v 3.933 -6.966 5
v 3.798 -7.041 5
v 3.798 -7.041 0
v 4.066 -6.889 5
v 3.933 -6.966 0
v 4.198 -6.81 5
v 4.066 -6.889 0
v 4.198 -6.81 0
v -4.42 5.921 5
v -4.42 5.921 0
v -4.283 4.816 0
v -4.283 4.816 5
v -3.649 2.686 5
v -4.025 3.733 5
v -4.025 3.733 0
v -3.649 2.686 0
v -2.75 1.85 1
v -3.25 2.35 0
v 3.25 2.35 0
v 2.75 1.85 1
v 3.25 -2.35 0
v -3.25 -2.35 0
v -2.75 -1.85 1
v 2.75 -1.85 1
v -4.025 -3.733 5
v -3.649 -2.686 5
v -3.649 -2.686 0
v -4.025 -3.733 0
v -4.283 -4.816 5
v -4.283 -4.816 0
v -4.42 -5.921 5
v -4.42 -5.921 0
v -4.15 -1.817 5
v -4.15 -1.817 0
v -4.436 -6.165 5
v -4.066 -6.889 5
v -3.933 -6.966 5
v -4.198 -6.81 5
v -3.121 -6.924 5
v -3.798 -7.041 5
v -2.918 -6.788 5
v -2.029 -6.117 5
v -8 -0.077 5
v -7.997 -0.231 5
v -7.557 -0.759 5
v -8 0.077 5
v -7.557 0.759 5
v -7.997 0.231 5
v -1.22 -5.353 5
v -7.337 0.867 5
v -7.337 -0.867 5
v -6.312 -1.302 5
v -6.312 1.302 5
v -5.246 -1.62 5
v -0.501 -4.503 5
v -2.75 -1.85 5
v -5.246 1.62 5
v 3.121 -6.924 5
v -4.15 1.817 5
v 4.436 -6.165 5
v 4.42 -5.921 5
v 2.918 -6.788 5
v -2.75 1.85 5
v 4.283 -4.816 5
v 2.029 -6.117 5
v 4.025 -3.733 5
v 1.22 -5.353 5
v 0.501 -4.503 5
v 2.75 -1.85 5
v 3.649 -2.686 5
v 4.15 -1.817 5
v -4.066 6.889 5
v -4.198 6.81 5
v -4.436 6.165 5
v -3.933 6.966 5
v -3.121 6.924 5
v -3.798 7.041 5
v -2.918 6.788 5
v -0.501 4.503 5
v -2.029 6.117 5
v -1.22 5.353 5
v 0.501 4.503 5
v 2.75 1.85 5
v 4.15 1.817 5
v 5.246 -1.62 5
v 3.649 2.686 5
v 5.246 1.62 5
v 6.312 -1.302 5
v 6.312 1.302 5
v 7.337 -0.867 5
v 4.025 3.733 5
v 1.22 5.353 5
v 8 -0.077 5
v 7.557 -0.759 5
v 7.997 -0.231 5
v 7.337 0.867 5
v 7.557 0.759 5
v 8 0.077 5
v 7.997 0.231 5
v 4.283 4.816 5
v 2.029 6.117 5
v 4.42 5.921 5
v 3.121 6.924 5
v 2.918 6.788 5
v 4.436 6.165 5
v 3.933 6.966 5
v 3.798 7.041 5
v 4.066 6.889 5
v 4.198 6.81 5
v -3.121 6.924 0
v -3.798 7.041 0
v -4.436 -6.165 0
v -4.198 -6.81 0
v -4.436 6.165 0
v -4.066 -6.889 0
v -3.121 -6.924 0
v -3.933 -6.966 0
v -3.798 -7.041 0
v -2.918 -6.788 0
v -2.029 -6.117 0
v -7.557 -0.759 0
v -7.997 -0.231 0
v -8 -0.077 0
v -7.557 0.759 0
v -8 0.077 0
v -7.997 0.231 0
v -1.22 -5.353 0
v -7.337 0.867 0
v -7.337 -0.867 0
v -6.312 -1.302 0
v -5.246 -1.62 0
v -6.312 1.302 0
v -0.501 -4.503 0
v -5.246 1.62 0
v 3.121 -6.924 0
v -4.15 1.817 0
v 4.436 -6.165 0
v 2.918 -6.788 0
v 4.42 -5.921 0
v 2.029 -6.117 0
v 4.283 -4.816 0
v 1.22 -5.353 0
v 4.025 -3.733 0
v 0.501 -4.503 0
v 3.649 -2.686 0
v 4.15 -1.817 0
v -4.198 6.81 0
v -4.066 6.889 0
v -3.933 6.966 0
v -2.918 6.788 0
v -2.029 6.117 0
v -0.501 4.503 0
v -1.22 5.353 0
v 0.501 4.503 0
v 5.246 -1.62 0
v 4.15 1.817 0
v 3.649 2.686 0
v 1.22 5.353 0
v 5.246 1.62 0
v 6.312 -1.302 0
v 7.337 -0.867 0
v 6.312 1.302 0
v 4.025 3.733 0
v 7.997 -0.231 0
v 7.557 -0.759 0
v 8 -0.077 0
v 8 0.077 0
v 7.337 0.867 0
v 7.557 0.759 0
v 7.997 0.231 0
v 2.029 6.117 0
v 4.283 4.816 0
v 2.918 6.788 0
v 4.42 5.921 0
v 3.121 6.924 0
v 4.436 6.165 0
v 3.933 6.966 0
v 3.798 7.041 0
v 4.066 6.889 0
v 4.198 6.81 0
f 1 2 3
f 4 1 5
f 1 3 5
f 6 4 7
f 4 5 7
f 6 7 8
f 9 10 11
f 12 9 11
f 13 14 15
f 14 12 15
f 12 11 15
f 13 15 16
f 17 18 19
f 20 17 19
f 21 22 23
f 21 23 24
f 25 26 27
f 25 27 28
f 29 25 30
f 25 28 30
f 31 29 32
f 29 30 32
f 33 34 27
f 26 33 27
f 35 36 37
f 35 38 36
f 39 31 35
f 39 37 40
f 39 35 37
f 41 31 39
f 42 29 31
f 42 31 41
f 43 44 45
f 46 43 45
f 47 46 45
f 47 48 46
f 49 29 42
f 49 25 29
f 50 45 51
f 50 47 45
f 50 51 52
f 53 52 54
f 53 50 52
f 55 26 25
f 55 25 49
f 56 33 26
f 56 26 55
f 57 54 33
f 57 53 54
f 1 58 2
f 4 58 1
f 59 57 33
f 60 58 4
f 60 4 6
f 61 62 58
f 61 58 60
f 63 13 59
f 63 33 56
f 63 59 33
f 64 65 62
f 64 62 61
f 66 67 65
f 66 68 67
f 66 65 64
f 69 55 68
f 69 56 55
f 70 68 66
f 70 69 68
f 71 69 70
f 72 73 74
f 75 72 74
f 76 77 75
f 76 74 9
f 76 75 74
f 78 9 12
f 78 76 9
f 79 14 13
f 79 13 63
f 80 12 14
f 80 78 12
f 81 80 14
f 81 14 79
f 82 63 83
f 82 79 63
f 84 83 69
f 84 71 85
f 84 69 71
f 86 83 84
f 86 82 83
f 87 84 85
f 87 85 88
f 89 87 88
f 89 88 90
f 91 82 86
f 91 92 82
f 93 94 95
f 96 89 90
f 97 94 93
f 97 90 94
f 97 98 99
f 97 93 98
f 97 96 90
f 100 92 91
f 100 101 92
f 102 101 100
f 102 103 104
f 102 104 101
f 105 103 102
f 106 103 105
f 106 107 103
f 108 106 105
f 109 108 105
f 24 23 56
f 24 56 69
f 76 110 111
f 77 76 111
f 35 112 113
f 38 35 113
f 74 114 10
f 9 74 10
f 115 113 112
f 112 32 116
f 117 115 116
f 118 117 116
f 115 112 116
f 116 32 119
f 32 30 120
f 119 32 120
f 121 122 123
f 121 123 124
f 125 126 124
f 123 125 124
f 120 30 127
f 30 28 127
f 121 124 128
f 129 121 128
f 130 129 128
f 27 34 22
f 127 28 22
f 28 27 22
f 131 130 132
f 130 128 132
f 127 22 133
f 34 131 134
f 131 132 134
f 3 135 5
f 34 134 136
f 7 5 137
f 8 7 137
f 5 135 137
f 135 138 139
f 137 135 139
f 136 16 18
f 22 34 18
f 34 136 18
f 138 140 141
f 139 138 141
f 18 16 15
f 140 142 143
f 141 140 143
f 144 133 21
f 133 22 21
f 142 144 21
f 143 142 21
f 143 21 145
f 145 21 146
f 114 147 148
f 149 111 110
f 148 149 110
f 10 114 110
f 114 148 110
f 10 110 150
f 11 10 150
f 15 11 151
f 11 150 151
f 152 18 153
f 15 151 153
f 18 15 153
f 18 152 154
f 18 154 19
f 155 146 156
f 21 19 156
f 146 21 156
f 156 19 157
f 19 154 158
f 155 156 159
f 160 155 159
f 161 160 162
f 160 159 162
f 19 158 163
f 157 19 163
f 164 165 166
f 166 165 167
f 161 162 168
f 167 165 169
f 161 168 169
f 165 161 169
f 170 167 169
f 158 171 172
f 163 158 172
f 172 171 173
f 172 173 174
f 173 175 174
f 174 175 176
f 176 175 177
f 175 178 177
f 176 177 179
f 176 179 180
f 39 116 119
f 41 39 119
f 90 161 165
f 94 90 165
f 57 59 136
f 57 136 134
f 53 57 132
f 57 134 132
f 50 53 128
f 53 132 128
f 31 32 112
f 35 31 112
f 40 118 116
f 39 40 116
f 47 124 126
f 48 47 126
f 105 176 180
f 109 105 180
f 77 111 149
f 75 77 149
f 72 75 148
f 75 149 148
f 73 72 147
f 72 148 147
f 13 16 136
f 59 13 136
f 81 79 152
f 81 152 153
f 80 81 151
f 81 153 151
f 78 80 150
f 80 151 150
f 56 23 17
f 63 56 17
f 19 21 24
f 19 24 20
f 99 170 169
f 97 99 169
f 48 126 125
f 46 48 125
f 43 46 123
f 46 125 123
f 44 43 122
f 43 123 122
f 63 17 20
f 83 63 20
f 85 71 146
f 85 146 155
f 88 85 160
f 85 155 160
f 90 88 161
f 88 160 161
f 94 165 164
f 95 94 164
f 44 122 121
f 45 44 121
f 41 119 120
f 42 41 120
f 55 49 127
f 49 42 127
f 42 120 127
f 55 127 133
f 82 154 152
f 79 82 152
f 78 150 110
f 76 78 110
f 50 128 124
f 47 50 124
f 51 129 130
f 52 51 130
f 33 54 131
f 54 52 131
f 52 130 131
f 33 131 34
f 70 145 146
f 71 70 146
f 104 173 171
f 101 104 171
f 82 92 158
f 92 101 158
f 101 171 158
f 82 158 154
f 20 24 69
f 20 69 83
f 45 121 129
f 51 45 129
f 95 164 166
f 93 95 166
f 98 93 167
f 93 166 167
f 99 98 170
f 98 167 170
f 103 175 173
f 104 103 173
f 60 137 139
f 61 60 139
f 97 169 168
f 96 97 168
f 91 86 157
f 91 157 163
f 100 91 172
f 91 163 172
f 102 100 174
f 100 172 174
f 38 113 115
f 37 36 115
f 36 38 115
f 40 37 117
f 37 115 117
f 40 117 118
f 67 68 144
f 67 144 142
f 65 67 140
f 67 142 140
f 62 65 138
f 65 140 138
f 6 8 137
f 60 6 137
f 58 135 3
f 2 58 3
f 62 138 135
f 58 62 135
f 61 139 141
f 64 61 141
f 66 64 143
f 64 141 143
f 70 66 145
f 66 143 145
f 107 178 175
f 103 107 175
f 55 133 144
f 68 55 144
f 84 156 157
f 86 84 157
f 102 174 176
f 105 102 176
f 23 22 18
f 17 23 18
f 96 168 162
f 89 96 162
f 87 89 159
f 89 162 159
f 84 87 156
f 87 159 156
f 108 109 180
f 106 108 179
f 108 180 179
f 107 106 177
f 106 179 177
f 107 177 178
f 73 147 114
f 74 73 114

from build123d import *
from OCP.BRepFilletAPI import BRepFilletAPI_MakeChamfer

# Parameters (mm, degrees)
SKETCH1_R           = 8
SKETCH1_W           = 5.5
SKETCH1_H           = 3.7
BOSS_EXTRUDE1_DEPTH = 5
CUT_EXTRUDE1_DEPTH  = 13.369316877
CIRPATTERN1_COUNT   = 6
FILLET1_R           = 10
CHAMFER1_SIZE       = 1
CHAMFER1_SIZE2      = 0.5


with BuildPart() as part:
    # Sketch1 → Boss-Extrude1 (new body)
    with BuildSketch(Plane.XY):
        Circle(SKETCH1_R)
        Rectangle(SKETCH1_W, SKETCH1_H, mode=Mode.SUBTRACT)
    extrude(amount=BOSS_EXTRUDE1_DEPTH)

    # Sketch2 → Cut-Extrude1 (cut, through all)
    with BuildSketch(Plane.XY):
        Polygon((-7.331932906, 22.221764399), (0, 24.952212466), (7.331932906, 22.221764399), (3.798424573, 7.040736522), (3.120998591, 6.924019842), (1.330058439, 5.723612136), (0.501497444, 4.50257488), (-0.501497444, 4.50257488), (-1.330058439, 5.723612136), (-3.120998591, 6.924019842), (-3.798424573, 7.040736522), align=None)
    cut_extrude1 = extrude(amount=CUT_EXTRUDE1_DEPTH, mode=Mode.SUBTRACT)

    # CirPattern1: Cut-Extrude1 ×6 about axis
    cirpattern1_axis = Axis((0, 0, 0), (0, 0, 1))
    for i in range(1, CIRPATTERN1_COUNT):
        add(cut_extrude1.rotate(cirpattern1_axis, i * 360 / CIRPATTERN1_COUNT), mode=Mode.SUBTRACT)

    # Fillet1
    # the kernel refuses this fillet: 10 mm, written as the material it takes off along each edge
    with BuildSketch(Plane(origin=(-1.330058439, -5.723612136, -4.777865205), x_dir=(0.5615014183372642, 0.8274757743917586, 0), z_dir=(0, 0, 1)), Plane(origin=(5.621822731, 1.709941671, -4.777865205), x_dir=(-0.997365750808096, 0.07253660534518461, 0), z_dir=(0, 0, 1)), Plane(origin=(4.291764291, -4.013670465, -4.777865205), x_dir=(-0.43586433247083195, 0.9000123797369435, 0), z_dir=(0, 0, 1)), Plane(origin=(-5.621822731, -1.709941671, -4.777865205), x_dir=(0.997365750808096, -0.07253660534518423, 0), z_dir=(0, 0, 1)), Plane(origin=(-4.291764291, 4.013670465, -4.777865205), x_dir=(0.43586433247083256, -0.900012379736943, 0), z_dir=(0, 0, 1)), Plane(origin=(1.330058439, 5.723612136, -4.777865205), x_dir=(-0.561501418337264, -0.8274757743917588, 0), z_dir=(0, 0, 1))) as fillet1_piece_1:
        with BuildLine():
            CenterArc((1.975419419, 9.987502063), FILLET1_R, 247.992328485, 19.142820558)
            Line((-1.771887917, 0.716165173), (-1.846834064, 0.530738436))
            Line((-1.846834064, 0.530738436), (-0.074946147, -0.185426738))
            Line((-0.074946147, -0.185426738), (0, -0.2))
            ThreePointArc((0, -0.2), (0.737808461, -0.2), (1.465620873, -0.199750041))
            Line((1.465620873, -0.199750041), (1.475616922, 0))
        make_face()
    extrude(amount=14.55573041, mode=Mode.SUBTRACT)
    with BuildSketch(Plane(origin=(5.621822731, -1.709941671, -4.777865205), x_dir=(0.8975096924716217, 0.44099473003596645, 0), z_dir=(0, 0, 1)), Plane(origin=(1.330058439, -5.723612136, -4.777865205), x_dir=(0.8306674853820185, -0.5567688288052, 0), z_dir=(0, 0, 1)), Plane(origin=(-4.291764291, -4.013670465, -4.777865205), x_dir=(-0.06684220708960342, -0.9977635588411669, 0), z_dir=(0, 0, 1)), Plane(origin=(-5.621822731, 1.709941671, -4.777865205), x_dir=(-0.8975096924716216, -0.44099473003596684, 0), z_dir=(0, 0, 1)), Plane(origin=(4.291764291, 4.013670465, -4.777865205), x_dir=(0.06684220708960296, 0.9977635588411669, 0), z_dir=(0, 0, 1)), Plane(origin=(-1.330058439, 5.723612136, -4.777865205), x_dir=(-0.8306674853820185, 0.5567688288052001, 0), z_dir=(0, 0, 1))) as fillet1_piece_2:
        with BuildLine():
            CenterArc((1.911146082, 10), FILLET1_R, 250.857179442, 19.142820558)
            Line((-1.368094161, 0.552959012), (-1.433678966, 0.364018192))
            ThreePointArc((-1.433678966, 0.364018192), (-0.758993227, 0.091052768), (-0.074946147, -0.185426738))
            Line((-0.074946147, -0.185426738), (0, -0.2))
            Line((0, -0.2), (1.911146082, -0.2))
            Line((1.911146082, -0.2), (1.911146082, 0))
        make_face()
    extrude(amount=14.55573041, mode=Mode.SUBTRACT)

    # Chamfer1: one chamfer whose edges measure the first distance from different faces: ONE call of the kernel's chamfer builder (chamfer() names one face for all edges)
    chamfer1_edges_1 = [part.edges().sort_by_distance(p)[0] for p in [
        (-2.75, 0, 0),
    ]]
    chamfer1_side_1 = [part.faces().sort_by_distance(p)[0] for p in [
        (-2.75, 0, 2.5),
    ]]
    chamfer1_edges_2 = [part.edges().sort_by_distance(p)[0] for p in [
        (0, -1.85, 0),
    ]]
    chamfer1_side_2 = [part.faces().sort_by_distance(p)[0] for p in [
        (0, -1.85, 2.5),
    ]]
    chamfer1_edges_3 = [part.edges().sort_by_distance(p)[0] for p in [
        (2.75, 0, 0),
    ]]
    chamfer1_side_3 = [part.faces().sort_by_distance(p)[0] for p in [
        (2.75, 0, 2.5),
    ]]
    chamfer1_edges_4 = [part.edges().sort_by_distance(p)[0] for p in [
        (0, 1.85, 0),
    ]]
    chamfer1_side_4 = [part.faces().sort_by_distance(p)[0] for p in [
        (0, 1.85, 2.5),
    ]]
    chamfer1 = BRepFilletAPI_MakeChamfer(part.part.solid().wrapped)
    for e in chamfer1_edges_1:
        chamfer1.Add(CHAMFER1_SIZE, CHAMFER1_SIZE2, e.wrapped, chamfer1_side_1[0].wrapped)  # the first distance lies on this face
    for e in chamfer1_edges_2:
        chamfer1.Add(CHAMFER1_SIZE, CHAMFER1_SIZE2, e.wrapped, chamfer1_side_2[0].wrapped)  # the first distance lies on this face
    for e in chamfer1_edges_3:
        chamfer1.Add(CHAMFER1_SIZE, CHAMFER1_SIZE2, e.wrapped, chamfer1_side_3[0].wrapped)  # the first distance lies on this face
    for e in chamfer1_edges_4:
        chamfer1.Add(CHAMFER1_SIZE, CHAMFER1_SIZE2, e.wrapped, chamfer1_side_4[0].wrapped)  # the first distance lies on this face
    add(Compound.cast(chamfer1.Shape()), mode=Mode.REPLACE)


solid = part.part
